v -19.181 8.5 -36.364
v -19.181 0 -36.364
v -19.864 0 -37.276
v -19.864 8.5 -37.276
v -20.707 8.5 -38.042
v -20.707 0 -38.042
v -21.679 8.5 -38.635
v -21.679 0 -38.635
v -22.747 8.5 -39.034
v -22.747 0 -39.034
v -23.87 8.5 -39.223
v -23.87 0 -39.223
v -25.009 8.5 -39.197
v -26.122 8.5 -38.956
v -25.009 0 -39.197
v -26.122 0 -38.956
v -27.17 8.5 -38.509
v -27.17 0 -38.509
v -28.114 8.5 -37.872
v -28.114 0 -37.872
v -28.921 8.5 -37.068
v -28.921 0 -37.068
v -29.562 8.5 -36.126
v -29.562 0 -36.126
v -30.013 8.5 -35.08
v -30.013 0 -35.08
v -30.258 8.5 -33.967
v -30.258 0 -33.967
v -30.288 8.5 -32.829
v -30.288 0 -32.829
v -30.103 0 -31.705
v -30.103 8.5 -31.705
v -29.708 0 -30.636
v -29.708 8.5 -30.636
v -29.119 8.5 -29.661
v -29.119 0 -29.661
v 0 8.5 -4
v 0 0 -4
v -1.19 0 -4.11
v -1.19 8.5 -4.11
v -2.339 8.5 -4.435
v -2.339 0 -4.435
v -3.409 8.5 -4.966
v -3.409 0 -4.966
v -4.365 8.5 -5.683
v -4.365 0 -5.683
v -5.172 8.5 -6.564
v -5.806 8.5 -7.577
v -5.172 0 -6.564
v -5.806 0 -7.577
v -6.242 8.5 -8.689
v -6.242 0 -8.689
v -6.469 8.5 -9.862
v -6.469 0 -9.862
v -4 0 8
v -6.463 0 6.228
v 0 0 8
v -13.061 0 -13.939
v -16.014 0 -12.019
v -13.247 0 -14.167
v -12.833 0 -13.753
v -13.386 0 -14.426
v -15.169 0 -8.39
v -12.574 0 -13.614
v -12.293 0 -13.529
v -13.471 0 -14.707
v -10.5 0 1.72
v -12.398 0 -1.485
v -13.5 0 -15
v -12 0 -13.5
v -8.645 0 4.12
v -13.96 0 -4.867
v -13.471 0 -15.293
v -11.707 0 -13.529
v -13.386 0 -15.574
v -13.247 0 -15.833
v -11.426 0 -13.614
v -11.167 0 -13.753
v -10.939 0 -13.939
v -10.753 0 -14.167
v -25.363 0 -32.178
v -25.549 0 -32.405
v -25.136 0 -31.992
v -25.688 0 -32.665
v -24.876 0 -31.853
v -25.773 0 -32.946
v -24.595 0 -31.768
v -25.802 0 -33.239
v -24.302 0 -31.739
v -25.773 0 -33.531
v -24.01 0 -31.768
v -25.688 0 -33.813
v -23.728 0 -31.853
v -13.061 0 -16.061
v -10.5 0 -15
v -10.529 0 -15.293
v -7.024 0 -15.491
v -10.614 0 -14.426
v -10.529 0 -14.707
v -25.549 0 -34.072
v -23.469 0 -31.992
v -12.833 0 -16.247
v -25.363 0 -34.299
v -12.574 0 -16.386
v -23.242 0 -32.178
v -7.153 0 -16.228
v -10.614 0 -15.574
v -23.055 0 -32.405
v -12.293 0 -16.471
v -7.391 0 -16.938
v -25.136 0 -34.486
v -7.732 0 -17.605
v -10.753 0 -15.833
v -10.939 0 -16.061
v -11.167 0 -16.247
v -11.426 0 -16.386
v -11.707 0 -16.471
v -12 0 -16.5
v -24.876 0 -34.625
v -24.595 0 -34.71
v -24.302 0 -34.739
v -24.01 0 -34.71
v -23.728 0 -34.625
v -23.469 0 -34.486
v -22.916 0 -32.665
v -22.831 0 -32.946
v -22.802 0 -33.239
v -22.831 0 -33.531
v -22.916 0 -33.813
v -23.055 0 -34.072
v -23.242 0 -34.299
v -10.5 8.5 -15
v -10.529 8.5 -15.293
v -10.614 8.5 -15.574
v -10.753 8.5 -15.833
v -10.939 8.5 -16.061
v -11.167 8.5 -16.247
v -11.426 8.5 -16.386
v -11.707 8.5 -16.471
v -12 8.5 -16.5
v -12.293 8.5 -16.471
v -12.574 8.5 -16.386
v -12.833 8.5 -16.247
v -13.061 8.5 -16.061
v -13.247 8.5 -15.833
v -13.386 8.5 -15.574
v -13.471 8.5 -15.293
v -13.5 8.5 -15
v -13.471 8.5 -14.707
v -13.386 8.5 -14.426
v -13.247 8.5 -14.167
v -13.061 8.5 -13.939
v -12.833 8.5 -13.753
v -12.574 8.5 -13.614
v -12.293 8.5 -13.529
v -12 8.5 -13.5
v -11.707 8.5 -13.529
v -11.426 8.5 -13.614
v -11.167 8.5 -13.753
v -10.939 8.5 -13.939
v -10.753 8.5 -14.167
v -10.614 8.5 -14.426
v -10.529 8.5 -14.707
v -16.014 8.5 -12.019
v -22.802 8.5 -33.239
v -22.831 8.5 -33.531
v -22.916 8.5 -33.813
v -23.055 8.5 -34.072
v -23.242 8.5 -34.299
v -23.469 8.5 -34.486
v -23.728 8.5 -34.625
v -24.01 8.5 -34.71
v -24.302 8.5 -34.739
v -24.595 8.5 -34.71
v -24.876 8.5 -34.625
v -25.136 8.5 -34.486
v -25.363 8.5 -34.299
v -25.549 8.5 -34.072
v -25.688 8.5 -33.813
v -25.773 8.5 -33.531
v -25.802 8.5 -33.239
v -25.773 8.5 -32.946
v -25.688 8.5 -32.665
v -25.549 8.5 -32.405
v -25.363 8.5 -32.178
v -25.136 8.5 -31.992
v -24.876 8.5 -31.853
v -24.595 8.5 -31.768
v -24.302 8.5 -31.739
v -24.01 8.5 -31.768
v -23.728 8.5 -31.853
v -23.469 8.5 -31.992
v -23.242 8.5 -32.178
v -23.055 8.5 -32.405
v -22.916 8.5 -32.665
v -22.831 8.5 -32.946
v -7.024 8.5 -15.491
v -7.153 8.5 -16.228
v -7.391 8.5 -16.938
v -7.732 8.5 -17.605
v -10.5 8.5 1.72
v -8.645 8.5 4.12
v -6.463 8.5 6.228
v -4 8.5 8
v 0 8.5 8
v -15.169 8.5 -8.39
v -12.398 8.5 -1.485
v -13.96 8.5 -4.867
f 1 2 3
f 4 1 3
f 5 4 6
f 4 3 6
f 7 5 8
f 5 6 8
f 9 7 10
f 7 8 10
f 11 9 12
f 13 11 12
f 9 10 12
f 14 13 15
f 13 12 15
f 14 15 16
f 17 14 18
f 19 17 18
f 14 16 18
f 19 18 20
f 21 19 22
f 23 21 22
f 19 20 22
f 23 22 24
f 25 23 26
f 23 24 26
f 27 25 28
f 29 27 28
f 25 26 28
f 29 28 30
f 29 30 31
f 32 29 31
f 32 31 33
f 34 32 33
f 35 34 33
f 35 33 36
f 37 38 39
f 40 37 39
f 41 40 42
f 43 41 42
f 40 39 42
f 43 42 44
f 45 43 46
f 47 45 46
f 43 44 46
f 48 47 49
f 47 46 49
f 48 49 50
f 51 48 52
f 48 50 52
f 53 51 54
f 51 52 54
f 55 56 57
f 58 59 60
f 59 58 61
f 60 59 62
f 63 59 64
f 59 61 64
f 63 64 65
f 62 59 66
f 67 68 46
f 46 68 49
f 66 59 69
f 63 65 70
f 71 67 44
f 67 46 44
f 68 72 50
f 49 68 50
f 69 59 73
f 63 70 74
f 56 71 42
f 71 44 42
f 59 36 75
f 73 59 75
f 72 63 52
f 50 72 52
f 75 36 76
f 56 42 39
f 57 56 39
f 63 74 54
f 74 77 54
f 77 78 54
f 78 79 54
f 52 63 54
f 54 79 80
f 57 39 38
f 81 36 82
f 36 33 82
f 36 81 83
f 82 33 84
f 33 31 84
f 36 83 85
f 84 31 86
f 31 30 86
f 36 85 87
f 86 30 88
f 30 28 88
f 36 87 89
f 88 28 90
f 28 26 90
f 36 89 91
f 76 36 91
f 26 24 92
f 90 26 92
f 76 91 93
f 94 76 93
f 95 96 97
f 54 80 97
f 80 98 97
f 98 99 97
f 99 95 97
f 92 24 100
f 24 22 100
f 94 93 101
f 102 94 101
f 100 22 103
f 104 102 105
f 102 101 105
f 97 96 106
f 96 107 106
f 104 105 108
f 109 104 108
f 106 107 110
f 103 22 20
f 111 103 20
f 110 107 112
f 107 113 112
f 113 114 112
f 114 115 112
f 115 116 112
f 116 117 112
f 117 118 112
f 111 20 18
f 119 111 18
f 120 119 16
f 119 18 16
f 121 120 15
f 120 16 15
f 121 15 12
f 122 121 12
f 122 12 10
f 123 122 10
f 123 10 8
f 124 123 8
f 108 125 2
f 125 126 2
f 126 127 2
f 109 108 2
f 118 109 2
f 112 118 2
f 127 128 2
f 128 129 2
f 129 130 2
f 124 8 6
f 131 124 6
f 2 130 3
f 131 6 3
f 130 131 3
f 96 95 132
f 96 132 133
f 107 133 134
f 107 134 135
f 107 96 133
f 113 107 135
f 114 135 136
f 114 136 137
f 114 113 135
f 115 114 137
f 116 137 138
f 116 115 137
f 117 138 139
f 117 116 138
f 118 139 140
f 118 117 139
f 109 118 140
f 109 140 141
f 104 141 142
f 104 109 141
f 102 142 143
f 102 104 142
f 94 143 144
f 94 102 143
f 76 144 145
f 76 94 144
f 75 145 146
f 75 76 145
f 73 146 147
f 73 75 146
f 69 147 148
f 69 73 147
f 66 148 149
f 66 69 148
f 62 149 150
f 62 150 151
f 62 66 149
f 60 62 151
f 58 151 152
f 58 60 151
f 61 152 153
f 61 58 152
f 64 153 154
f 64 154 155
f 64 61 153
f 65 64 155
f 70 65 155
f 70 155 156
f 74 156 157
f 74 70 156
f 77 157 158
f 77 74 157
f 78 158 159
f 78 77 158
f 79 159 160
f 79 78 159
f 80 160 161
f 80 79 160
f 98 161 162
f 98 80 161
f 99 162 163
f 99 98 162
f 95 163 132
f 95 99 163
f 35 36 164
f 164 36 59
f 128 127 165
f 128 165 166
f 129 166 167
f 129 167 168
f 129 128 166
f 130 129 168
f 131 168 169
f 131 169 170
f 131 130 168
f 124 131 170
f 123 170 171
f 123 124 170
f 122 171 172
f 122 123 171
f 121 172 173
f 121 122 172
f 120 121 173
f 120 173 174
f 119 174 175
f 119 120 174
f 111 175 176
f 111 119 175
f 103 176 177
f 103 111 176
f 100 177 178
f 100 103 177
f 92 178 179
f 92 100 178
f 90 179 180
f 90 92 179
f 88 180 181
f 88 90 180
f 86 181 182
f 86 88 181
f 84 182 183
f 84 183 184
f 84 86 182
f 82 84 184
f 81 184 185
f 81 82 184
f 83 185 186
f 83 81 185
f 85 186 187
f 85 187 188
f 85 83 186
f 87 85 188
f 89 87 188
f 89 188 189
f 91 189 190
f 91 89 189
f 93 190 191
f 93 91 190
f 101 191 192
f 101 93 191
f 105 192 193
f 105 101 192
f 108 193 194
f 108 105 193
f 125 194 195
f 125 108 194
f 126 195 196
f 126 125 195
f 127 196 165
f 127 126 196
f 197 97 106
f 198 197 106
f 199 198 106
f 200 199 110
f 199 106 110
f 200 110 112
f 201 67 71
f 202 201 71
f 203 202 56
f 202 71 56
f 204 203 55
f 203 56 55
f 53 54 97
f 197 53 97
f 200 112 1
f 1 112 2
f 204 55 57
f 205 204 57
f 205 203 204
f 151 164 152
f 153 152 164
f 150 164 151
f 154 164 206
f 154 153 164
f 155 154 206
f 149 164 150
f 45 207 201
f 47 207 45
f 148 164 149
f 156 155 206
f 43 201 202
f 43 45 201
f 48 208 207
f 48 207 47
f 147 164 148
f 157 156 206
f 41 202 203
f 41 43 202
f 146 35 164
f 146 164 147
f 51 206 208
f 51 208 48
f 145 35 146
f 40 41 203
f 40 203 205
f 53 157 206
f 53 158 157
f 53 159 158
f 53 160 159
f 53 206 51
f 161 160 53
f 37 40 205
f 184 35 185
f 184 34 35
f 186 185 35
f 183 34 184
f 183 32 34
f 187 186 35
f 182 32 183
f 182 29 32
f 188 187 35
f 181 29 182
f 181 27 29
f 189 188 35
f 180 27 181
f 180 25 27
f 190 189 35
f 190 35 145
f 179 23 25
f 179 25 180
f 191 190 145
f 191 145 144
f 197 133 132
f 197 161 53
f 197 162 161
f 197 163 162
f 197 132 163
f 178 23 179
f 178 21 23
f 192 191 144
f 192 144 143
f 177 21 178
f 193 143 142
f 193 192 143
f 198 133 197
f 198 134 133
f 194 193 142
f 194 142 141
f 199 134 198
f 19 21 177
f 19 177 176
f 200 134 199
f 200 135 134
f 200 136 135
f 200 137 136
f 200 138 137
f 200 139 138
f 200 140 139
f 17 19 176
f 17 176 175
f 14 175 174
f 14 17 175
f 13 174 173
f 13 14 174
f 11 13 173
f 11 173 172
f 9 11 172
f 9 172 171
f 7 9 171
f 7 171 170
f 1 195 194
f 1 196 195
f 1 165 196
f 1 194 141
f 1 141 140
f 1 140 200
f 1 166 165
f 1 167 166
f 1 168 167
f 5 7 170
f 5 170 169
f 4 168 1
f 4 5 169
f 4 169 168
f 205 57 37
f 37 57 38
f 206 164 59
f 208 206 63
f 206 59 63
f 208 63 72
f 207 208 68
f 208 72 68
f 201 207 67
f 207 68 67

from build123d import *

# Parameters (mm, degrees)
CROQUIS1_R              = 1.5
SALIENTE_EXTRUIR1_DEPTH = 8.5


with BuildPart() as part:
    # Croquis1 → Saliente-Extruir1 (new body)
    with BuildSketch(Plane(origin=(0, 0, 0), x_dir=(1, 0, 0), z_dir=(0, 1, 0))):
        with BuildLine():
            Line((-29.118820837, 29.661035883), (-16.013814133, 12.018507739))
            ThreePointArc((-16.013814133, 12.018507739), (-13.96004638, 4.867227057), (-10.5, -1.719642946))
            ThreePointArc((-10.5, -1.719642946), (-7.591888883, -5.213667237), (-4, -8))
            Line((-4, -8), (0, -8))
            Line((0, -8), (0, 4))
            ThreePointArc((0, 4), (-4.364647968, 5.683377936), (-6.468572218, 9.861585197))
            Line((-6.468572218, 9.861585197), (-7.024175217, 15.49108831))
            ThreePointArc((-7.024175217, 15.49108831), (-7.25881516, 16.587818098), (-7.732007274, 17.604657001))
            Line((-7.732007274, 17.604657001), (-19.180652605, 36.364414997))
            ThreePointArc((-19.180652605, 36.364414997), (-27.657401297, 38.213052032), (-29.118820837, 29.661035883))
        make_face()
        with Locations((-24.302243876, 33.238826596)):
            Circle(CROQUIS1_R, mode=Mode.SUBTRACT)
        with Locations((-12, 15)):
            Circle(CROQUIS1_R, mode=Mode.SUBTRACT)
    extrude(amount=SALIENTE_EXTRUIR1_DEPTH)


solid = part.part
